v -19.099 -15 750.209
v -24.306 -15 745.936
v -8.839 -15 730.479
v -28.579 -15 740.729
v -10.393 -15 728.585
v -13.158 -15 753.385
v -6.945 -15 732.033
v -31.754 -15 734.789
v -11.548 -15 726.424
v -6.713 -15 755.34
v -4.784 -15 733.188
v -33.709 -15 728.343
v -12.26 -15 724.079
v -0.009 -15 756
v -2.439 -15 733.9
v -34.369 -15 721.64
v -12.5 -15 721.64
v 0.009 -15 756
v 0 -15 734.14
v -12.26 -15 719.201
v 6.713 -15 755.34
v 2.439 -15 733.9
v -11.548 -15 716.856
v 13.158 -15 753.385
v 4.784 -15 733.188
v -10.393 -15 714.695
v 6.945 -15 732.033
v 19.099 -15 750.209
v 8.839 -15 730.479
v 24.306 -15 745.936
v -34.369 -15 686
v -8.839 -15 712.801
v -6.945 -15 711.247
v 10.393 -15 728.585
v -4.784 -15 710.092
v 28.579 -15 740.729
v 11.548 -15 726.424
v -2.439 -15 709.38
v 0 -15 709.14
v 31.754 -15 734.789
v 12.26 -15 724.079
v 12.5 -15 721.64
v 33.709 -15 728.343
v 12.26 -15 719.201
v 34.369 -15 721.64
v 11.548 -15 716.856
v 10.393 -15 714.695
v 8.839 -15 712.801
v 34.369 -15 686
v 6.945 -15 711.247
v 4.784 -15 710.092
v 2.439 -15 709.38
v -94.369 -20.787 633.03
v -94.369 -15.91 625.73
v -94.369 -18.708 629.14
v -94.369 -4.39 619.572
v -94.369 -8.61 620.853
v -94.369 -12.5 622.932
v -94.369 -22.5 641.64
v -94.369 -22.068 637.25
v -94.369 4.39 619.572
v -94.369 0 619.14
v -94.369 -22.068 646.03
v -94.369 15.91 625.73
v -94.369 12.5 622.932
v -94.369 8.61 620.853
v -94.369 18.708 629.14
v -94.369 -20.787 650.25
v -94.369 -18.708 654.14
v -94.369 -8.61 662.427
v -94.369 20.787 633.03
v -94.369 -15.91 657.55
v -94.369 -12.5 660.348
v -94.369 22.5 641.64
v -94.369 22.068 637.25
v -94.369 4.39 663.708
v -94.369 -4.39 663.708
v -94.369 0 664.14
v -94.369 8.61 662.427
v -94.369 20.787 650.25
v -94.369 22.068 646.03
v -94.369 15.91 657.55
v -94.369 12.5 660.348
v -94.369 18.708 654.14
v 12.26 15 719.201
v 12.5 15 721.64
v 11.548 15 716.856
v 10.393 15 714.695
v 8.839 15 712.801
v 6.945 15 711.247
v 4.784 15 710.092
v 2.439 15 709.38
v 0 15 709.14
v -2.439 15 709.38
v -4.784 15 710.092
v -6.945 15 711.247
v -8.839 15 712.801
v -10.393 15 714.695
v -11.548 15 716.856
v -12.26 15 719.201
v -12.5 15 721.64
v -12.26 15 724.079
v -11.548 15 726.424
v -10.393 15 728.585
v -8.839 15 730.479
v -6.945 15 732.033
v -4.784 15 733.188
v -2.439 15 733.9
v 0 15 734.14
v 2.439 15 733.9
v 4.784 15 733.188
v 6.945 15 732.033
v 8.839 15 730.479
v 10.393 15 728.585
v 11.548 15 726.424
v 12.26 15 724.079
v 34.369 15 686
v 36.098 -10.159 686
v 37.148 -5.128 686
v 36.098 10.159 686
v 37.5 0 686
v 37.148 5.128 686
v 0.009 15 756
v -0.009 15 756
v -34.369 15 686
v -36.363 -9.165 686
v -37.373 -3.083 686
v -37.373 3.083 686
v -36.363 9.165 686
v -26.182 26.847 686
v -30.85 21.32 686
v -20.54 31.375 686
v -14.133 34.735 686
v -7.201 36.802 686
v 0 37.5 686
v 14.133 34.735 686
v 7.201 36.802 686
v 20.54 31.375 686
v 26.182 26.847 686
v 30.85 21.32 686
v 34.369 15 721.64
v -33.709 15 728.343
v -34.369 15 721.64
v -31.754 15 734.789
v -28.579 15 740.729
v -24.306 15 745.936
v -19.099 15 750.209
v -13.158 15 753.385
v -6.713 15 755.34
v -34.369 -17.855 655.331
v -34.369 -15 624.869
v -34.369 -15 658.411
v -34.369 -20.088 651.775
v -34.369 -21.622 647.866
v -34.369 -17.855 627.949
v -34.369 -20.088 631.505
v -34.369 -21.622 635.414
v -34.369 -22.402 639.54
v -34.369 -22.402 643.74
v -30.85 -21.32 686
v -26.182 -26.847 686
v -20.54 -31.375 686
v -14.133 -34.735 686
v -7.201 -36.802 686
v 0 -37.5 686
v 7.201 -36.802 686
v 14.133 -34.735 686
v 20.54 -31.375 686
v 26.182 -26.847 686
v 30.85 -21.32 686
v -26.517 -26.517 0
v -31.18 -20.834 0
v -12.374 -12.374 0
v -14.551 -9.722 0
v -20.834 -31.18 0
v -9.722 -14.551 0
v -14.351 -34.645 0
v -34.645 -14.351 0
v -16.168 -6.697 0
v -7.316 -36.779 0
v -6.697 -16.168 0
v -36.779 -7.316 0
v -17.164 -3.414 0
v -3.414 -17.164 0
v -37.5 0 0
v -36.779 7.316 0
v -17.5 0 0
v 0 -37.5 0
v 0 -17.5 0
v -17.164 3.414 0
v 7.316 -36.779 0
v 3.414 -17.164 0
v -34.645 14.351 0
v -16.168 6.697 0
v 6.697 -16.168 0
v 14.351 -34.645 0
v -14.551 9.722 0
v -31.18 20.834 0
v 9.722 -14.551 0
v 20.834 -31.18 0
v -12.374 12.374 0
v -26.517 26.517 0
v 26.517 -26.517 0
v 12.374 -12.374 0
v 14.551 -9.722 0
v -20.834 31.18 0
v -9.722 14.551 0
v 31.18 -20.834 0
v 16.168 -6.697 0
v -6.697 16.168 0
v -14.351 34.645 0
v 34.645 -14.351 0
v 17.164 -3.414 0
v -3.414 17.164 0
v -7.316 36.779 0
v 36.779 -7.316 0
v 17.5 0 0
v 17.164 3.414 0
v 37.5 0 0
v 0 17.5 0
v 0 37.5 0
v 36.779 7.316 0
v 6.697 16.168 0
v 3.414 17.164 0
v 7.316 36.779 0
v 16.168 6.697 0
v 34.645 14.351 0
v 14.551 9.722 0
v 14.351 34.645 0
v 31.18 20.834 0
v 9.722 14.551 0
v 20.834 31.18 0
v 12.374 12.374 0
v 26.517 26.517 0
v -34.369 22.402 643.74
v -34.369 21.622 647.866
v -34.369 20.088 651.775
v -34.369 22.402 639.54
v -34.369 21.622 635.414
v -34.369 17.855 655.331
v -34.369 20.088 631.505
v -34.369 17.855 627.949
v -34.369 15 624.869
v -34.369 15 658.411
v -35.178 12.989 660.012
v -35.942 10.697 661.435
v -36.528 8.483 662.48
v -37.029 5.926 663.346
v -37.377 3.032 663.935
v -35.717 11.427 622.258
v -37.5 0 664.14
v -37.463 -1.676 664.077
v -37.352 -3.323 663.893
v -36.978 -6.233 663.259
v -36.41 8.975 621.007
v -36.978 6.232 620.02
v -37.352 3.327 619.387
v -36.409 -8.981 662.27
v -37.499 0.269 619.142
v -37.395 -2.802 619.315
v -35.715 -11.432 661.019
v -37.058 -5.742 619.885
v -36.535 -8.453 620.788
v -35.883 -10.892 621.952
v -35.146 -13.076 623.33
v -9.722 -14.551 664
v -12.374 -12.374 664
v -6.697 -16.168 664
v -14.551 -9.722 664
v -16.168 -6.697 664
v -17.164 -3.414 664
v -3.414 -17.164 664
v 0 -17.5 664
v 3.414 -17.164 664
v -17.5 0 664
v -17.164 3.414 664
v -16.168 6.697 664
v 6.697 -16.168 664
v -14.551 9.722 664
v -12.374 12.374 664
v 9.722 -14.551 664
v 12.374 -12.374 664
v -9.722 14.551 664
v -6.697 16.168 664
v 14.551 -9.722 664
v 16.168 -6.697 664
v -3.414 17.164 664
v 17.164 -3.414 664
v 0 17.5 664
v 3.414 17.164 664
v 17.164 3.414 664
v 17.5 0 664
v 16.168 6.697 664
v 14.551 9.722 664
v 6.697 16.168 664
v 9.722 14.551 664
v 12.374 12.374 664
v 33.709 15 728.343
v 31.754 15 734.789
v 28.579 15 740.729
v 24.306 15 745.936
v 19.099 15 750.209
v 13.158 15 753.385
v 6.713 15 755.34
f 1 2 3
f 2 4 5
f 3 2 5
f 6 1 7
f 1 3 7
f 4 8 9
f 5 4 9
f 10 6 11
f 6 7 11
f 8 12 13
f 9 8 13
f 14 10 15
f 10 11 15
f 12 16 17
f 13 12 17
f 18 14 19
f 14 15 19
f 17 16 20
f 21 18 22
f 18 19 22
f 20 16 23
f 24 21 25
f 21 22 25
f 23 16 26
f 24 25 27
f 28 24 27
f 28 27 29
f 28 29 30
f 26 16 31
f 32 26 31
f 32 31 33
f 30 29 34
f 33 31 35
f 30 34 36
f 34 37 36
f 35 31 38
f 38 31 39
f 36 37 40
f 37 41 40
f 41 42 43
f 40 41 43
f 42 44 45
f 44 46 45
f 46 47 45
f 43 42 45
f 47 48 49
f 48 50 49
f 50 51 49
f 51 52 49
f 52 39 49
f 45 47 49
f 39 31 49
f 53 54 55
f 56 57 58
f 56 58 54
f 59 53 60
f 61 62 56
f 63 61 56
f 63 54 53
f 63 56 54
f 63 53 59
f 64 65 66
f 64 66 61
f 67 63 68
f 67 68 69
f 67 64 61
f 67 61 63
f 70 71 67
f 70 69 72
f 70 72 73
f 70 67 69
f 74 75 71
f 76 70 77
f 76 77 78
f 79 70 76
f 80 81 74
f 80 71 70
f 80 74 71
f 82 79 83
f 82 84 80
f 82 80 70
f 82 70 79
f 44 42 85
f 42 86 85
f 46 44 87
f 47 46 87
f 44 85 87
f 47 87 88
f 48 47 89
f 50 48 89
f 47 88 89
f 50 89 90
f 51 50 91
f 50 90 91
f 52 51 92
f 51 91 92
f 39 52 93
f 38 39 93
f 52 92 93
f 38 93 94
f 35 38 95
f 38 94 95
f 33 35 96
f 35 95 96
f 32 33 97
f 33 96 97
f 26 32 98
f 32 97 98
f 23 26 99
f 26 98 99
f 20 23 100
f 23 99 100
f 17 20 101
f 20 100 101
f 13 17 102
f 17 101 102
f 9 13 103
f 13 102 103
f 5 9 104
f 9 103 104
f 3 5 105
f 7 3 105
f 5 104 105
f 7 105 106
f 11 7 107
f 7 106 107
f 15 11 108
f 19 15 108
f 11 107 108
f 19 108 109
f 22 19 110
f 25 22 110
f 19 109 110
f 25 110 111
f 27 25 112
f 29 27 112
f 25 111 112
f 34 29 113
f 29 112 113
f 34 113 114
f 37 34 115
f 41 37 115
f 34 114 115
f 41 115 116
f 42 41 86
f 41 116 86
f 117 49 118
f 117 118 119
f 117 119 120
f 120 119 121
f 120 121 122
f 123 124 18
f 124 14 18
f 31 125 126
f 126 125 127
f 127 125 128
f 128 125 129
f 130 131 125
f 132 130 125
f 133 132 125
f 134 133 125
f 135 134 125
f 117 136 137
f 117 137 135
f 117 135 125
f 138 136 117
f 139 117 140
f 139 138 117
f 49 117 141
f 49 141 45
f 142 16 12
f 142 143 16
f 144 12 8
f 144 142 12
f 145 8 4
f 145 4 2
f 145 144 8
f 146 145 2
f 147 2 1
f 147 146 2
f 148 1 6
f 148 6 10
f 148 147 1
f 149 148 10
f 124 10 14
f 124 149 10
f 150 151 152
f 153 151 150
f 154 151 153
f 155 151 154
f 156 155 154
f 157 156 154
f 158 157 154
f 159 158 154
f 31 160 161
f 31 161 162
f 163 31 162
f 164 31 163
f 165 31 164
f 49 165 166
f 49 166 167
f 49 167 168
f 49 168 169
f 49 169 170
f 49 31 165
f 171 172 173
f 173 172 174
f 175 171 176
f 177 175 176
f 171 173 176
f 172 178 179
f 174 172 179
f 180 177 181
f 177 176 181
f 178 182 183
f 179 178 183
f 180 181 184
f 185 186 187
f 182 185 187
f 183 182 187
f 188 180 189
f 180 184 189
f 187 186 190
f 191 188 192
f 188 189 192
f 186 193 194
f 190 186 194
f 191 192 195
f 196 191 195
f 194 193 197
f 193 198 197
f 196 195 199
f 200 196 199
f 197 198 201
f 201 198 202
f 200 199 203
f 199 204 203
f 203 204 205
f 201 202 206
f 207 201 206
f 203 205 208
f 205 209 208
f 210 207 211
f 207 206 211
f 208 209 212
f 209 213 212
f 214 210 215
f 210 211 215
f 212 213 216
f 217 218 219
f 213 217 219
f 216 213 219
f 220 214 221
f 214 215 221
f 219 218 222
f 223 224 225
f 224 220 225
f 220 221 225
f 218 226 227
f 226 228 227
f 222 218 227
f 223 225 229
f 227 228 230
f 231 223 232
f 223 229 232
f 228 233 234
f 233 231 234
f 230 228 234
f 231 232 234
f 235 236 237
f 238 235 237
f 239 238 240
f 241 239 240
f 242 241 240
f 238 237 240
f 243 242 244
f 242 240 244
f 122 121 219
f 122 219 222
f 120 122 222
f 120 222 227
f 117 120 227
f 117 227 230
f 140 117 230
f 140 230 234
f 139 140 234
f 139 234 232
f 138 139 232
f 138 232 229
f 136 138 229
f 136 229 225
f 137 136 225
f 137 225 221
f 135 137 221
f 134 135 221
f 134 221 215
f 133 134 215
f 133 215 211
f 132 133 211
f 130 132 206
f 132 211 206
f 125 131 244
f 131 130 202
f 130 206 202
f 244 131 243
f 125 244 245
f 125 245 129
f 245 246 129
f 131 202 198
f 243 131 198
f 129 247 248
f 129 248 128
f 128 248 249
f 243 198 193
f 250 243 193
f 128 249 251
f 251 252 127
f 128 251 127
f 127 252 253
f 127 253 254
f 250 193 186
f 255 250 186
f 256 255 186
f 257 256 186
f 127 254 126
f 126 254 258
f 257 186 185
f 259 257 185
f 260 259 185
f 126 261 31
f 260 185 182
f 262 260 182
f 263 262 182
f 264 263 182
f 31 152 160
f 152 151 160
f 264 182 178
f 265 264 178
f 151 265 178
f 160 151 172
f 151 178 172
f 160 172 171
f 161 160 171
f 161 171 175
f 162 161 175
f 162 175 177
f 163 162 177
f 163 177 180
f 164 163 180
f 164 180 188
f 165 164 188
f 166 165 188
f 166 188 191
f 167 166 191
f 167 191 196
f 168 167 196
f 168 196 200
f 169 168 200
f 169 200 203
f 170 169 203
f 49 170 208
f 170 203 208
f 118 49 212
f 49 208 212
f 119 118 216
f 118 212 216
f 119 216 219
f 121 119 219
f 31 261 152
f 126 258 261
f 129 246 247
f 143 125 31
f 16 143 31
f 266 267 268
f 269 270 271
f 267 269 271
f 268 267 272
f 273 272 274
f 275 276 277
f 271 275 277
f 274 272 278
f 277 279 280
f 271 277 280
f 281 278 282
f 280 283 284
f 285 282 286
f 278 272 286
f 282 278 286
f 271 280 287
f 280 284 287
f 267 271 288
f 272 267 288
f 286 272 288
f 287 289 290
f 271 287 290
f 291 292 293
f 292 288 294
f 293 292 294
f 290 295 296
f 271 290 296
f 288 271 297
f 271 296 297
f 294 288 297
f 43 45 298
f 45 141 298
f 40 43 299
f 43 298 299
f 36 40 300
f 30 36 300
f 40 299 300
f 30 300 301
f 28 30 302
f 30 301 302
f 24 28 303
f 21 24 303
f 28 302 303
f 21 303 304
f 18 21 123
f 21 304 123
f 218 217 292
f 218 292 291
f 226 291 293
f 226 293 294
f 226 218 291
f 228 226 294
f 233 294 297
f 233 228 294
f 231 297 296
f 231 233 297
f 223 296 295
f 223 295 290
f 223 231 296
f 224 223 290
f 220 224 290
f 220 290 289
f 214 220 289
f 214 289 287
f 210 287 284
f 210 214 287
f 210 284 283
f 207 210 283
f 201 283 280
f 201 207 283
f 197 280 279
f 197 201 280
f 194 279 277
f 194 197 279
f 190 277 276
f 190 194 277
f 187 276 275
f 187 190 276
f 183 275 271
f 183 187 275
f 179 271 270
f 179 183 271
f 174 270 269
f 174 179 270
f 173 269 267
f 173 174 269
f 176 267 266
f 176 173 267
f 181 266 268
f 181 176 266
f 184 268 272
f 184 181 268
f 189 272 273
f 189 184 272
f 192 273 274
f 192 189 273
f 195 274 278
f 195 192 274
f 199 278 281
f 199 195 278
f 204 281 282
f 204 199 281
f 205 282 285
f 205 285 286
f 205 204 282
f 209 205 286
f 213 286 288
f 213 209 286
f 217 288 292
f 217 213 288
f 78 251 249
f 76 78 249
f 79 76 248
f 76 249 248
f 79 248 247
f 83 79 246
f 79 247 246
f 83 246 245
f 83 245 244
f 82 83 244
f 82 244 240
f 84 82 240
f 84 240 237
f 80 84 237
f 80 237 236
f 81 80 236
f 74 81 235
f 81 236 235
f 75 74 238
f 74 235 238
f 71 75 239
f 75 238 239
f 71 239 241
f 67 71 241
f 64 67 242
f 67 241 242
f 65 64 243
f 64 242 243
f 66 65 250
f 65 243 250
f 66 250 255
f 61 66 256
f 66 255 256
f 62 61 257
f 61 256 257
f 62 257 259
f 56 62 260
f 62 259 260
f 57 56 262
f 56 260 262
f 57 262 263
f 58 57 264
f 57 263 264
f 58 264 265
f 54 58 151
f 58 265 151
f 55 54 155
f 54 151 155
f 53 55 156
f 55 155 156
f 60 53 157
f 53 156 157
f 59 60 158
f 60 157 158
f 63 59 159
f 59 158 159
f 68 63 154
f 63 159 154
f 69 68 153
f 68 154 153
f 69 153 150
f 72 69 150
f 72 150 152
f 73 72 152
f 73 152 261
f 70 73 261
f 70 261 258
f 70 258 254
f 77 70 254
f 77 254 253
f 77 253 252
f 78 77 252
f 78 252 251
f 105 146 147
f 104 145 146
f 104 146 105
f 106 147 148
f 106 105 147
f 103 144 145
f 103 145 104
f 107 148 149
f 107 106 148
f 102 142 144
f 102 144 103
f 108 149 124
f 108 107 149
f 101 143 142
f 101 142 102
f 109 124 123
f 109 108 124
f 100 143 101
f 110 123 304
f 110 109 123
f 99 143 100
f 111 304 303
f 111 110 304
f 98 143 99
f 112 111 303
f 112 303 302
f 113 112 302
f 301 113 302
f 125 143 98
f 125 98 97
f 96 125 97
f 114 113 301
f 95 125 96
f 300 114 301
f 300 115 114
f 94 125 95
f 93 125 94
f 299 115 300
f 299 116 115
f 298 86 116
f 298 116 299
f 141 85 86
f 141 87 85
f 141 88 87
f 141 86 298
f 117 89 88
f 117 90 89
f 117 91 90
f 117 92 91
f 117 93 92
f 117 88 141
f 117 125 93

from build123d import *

# Parameters (mm, degrees)
SKETCH1_R           = 37.5
SKETCH1_R_2         = 17.5
BOSS_EXTRUDE1_DEPTH = 664
SKETCH5_R           = 37.5
BOSS_EXTRUDE2_DEPTH = 22
SKETCH8_W           = 68.738635424
SKETCH8_H           = 15
BOSS_EXTRUDE3_DEPTH = 70
FILLET1_R           = 34.36
SKETCH9_R           = 12.5
CUT_EXTRUDE1_DEPTH  = 100
SKETCH10_R          = 22.5
BOSS_EXTRUDE4_DEPTH = 60


with BuildPart() as part:
    # Sketch1 → Boss-Extrude1 (new body)
    with BuildSketch(Plane.XY):
        Circle(SKETCH1_R)
        Circle(SKETCH1_R_2, mode=Mode.SUBTRACT)
    extrude(amount=BOSS_EXTRUDE1_DEPTH)

    # Sketch5 → Boss-Extrude2 (add)
    with BuildSketch(Plane.XY.offset(664)):
        Circle(SKETCH5_R)
    extrude(amount=BOSS_EXTRUDE2_DEPTH)

    # Sketch8 → Boss-Extrude3 (add)
    with BuildSketch(Plane.XY.offset(686)):
        with Locations((0, -7.5)):
            Rectangle(SKETCH8_W, SKETCH8_H)
    boss_extrude3 = extrude(amount=BOSS_EXTRUDE3_DEPTH)

    # Mirror1: Boss-Extrude3 across plane
    add(boss_extrude3.mirror(Plane(origin=(-34.369317712, 0, 756), x_dir=(0, 0, 1), z_dir=(0, -1, 0))))

    # Fillet1
    fillet1_edges = [part.edges().sort_by_distance(p)[0] for p in [
        (-34.369317712, 0, 756),
        (34.369317712, 0, 756),
    ]]
    fillet(fillet1_edges, radius=FILLET1_R)

    # Sketch9 → Cut-Extrude1 (cut, symmetric)
    with BuildSketch(Plane(origin=(0, 15, 0), x_dir=(1, 0, 0), z_dir=(0, 1, 0))):
        with Locations((0, -721.64)):
            Circle(SKETCH9_R)
    extrude(amount=CUT_EXTRUDE1_DEPTH, both=True, mode=Mode.SUBTRACT)

    # Sketch10 → Boss-Extrude4 (add)
    with BuildSketch(Plane.ZY.offset(34.369317712)):
        with Locations((641.64, 0)):
            Circle(SKETCH10_R)
    extrude(amount=BOSS_EXTRUDE4_DEPTH)


solid = part.part
